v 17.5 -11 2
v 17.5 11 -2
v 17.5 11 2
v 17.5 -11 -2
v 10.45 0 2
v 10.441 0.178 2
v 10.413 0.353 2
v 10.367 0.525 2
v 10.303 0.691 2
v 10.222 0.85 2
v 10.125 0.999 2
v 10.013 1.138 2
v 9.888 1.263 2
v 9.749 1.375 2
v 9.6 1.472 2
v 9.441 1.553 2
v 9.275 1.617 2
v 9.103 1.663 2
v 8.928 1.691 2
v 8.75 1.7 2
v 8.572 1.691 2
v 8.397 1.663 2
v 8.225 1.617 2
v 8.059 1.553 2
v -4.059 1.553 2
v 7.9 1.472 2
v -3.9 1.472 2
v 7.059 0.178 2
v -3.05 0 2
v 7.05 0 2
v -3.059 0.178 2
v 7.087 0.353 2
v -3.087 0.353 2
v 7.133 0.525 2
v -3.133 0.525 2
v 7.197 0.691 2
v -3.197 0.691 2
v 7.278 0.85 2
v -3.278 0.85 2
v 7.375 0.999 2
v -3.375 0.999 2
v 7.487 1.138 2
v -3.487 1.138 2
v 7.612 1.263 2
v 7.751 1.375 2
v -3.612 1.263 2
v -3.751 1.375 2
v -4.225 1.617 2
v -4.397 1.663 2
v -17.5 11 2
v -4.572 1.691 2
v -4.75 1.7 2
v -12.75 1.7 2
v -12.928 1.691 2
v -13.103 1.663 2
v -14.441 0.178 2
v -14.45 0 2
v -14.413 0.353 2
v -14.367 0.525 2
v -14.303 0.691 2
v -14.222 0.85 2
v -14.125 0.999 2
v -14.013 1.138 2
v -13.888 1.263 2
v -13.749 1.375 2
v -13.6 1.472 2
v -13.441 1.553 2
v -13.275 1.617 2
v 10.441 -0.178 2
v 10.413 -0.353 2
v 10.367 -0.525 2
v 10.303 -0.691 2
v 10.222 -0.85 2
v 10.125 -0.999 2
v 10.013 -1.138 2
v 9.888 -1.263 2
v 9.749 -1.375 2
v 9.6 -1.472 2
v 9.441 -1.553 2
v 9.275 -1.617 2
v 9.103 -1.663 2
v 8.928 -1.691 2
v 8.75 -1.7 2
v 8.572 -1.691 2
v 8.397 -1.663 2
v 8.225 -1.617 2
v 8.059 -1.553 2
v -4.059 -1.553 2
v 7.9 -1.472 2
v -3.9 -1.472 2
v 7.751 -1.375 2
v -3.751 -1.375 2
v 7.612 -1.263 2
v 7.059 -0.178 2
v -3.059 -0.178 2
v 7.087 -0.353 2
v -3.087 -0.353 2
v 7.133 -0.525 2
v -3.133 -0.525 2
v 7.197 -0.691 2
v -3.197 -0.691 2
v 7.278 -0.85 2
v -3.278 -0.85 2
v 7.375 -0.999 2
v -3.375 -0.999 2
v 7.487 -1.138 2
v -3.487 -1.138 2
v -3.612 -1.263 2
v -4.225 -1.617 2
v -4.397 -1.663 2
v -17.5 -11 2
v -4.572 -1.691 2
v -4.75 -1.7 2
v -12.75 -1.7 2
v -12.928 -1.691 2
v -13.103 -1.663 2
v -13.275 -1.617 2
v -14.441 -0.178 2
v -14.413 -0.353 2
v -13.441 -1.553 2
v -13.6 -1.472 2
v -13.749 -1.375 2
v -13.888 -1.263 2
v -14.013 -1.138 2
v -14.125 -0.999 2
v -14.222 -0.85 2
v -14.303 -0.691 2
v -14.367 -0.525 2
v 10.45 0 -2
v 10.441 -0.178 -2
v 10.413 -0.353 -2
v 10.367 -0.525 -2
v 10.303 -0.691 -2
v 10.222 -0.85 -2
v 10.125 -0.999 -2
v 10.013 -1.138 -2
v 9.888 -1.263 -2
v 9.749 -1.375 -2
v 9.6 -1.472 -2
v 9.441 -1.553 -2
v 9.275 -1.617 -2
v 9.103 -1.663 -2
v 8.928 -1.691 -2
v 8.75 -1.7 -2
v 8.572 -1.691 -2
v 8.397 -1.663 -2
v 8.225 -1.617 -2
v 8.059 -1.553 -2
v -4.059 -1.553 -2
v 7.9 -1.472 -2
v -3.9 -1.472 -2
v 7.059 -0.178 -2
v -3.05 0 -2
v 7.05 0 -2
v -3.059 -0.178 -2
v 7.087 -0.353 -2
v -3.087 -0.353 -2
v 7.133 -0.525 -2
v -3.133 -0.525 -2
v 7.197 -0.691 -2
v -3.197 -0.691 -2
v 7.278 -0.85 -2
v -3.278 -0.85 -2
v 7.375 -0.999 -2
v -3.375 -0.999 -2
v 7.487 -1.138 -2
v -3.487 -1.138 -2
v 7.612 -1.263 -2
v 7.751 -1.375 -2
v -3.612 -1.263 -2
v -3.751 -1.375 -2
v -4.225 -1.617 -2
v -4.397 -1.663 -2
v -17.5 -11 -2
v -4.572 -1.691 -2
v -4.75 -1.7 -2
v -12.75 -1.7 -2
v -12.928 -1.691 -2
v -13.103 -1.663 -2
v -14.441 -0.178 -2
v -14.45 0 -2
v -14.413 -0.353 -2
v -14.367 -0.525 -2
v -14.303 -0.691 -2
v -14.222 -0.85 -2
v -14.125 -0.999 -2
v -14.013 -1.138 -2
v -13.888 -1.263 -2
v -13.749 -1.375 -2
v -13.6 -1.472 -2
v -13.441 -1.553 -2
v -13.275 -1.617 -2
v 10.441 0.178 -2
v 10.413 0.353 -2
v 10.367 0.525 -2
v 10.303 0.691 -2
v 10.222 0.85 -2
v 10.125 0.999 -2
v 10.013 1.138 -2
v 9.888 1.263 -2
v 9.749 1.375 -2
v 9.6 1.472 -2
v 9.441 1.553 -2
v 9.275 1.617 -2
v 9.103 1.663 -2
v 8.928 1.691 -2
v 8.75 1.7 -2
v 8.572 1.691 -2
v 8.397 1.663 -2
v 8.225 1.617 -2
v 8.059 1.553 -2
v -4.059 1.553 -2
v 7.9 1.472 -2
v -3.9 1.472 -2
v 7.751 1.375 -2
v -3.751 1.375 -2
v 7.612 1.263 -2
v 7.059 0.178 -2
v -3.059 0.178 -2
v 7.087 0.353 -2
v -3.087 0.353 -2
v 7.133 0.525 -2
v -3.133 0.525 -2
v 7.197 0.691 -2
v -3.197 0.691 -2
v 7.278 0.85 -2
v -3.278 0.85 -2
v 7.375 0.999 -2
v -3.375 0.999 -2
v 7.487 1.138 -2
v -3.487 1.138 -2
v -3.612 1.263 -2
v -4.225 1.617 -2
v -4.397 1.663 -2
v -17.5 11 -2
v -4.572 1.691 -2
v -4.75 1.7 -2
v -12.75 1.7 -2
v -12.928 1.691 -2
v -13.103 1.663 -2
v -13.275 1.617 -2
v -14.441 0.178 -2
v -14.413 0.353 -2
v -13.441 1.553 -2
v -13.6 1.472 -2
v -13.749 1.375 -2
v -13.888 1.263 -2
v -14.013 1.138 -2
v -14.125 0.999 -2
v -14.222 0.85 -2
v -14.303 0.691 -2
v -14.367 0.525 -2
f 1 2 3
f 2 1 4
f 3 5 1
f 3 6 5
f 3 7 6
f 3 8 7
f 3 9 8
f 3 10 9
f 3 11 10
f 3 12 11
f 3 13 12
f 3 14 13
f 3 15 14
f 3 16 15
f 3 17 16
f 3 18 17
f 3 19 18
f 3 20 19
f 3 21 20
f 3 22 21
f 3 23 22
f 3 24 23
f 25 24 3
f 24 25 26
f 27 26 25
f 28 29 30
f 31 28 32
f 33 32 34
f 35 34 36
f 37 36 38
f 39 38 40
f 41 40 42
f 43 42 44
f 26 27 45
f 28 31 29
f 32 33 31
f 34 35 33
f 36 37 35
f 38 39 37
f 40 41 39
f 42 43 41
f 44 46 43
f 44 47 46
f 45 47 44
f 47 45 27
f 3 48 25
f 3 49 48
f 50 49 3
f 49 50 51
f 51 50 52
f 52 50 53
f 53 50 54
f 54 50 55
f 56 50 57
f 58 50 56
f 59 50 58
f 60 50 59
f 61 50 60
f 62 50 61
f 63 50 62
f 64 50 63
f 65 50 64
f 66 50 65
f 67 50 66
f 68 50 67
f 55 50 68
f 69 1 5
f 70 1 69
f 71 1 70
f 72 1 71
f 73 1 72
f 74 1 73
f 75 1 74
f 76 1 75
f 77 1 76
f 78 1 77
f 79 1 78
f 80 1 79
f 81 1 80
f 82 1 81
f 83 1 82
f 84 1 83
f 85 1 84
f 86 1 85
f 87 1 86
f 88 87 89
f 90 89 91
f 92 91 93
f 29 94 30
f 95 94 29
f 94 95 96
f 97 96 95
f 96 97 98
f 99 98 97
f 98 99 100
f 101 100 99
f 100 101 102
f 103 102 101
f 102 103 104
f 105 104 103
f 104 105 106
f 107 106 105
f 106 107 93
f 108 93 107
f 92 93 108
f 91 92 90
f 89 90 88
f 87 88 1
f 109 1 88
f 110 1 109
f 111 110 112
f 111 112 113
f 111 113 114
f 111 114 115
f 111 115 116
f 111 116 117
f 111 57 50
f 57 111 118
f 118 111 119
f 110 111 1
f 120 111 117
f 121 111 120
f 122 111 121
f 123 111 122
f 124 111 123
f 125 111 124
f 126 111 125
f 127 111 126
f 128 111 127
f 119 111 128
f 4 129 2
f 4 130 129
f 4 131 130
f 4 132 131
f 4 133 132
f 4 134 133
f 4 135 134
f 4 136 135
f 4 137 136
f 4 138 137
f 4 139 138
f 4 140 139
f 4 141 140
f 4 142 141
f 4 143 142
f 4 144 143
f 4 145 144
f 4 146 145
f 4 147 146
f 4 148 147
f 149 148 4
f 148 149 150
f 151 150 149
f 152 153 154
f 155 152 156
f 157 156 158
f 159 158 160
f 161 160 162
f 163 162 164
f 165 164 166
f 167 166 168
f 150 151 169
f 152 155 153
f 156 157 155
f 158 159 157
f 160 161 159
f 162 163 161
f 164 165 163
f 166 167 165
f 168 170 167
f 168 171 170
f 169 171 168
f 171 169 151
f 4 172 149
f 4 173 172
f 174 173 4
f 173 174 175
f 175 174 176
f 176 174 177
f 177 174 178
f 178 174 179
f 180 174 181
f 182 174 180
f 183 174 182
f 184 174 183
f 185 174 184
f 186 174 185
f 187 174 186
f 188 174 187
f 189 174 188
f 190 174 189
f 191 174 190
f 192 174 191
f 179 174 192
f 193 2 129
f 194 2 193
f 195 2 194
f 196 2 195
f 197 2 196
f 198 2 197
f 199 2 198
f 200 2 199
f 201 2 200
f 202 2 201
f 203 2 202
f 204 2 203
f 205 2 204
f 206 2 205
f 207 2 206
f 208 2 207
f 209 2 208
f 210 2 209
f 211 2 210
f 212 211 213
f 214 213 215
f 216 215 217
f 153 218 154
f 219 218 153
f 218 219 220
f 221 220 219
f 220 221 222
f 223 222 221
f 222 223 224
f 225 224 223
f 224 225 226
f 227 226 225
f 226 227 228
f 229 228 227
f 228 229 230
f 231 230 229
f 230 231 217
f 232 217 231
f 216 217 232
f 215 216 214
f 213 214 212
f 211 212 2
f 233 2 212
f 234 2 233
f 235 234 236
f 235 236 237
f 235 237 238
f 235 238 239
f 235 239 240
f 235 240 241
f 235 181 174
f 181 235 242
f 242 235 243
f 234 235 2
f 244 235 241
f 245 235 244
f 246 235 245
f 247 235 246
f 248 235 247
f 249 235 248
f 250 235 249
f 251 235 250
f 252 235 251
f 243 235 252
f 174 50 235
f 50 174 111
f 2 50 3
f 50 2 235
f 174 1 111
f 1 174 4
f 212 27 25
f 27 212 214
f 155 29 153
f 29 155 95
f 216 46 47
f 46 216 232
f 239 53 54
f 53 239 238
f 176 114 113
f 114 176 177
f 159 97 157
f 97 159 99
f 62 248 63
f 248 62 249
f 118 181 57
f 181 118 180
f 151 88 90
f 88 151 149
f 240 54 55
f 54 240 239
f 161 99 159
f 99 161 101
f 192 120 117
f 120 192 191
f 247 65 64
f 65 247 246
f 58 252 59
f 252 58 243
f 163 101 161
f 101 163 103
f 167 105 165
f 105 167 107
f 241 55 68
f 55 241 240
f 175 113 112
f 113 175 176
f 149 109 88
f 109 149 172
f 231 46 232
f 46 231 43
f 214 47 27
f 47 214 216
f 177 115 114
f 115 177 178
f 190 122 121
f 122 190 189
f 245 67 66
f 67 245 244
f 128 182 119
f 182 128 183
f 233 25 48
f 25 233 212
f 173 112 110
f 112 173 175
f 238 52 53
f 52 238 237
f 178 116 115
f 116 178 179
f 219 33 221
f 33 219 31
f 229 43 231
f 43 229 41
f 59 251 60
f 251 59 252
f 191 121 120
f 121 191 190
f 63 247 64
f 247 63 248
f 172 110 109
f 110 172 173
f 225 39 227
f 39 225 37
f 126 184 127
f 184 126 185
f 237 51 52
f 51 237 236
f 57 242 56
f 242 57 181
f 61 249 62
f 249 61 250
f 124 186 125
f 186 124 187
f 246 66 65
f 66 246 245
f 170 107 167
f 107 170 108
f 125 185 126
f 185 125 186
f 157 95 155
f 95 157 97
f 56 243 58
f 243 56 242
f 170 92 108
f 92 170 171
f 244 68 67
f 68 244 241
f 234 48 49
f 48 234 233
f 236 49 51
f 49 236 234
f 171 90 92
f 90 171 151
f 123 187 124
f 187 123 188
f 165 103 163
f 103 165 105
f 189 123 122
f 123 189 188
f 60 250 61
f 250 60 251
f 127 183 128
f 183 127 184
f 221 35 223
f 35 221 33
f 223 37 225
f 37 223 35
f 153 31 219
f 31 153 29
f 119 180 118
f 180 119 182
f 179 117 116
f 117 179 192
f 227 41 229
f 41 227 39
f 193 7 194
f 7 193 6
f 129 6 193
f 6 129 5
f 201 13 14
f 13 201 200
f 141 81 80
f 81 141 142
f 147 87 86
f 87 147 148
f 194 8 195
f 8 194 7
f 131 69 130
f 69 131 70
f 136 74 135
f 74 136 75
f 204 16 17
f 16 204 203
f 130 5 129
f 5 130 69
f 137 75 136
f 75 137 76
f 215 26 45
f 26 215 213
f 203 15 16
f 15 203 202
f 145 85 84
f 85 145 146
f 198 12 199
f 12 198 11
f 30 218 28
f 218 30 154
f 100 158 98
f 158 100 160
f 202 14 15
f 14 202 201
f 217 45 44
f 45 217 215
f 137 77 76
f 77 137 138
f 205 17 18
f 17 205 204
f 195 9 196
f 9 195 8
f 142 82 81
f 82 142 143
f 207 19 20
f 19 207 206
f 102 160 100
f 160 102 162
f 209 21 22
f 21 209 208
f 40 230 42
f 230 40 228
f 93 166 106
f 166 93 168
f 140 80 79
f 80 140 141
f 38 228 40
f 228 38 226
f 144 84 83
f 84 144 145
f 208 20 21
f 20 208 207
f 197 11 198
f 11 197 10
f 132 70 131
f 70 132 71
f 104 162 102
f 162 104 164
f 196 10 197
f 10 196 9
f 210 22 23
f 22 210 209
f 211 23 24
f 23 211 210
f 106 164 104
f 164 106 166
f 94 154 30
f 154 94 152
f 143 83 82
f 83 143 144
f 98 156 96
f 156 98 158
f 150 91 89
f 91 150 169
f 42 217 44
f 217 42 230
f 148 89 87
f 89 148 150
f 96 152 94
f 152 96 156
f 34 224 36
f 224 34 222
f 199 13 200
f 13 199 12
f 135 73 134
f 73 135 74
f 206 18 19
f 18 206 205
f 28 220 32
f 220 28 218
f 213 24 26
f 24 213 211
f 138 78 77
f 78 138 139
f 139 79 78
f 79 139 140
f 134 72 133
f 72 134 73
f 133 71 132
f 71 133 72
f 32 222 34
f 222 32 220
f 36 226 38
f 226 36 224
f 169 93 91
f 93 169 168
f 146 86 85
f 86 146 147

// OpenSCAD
// Adjustable sensor mounting tab.
$fn = 60;
eps = 0.02;
length = 35;
width = 22;
thickness = 4;
slot_l = 8;
module slot(x) { hull() { translate([x-slot_l/2,0,-thickness/2-eps]) cylinder(d=3.4,h=thickness+2*eps); translate([x+slot_l/2,0,-thickness/2-eps]) cylinder(d=3.4,h=thickness+2*eps); } }
difference() { cube([length,width,thickness],center=true); slot(-length/4); translate([length/4,0,-thickness/2-eps]) cylinder(d=3.4,h=thickness+2*eps); }
